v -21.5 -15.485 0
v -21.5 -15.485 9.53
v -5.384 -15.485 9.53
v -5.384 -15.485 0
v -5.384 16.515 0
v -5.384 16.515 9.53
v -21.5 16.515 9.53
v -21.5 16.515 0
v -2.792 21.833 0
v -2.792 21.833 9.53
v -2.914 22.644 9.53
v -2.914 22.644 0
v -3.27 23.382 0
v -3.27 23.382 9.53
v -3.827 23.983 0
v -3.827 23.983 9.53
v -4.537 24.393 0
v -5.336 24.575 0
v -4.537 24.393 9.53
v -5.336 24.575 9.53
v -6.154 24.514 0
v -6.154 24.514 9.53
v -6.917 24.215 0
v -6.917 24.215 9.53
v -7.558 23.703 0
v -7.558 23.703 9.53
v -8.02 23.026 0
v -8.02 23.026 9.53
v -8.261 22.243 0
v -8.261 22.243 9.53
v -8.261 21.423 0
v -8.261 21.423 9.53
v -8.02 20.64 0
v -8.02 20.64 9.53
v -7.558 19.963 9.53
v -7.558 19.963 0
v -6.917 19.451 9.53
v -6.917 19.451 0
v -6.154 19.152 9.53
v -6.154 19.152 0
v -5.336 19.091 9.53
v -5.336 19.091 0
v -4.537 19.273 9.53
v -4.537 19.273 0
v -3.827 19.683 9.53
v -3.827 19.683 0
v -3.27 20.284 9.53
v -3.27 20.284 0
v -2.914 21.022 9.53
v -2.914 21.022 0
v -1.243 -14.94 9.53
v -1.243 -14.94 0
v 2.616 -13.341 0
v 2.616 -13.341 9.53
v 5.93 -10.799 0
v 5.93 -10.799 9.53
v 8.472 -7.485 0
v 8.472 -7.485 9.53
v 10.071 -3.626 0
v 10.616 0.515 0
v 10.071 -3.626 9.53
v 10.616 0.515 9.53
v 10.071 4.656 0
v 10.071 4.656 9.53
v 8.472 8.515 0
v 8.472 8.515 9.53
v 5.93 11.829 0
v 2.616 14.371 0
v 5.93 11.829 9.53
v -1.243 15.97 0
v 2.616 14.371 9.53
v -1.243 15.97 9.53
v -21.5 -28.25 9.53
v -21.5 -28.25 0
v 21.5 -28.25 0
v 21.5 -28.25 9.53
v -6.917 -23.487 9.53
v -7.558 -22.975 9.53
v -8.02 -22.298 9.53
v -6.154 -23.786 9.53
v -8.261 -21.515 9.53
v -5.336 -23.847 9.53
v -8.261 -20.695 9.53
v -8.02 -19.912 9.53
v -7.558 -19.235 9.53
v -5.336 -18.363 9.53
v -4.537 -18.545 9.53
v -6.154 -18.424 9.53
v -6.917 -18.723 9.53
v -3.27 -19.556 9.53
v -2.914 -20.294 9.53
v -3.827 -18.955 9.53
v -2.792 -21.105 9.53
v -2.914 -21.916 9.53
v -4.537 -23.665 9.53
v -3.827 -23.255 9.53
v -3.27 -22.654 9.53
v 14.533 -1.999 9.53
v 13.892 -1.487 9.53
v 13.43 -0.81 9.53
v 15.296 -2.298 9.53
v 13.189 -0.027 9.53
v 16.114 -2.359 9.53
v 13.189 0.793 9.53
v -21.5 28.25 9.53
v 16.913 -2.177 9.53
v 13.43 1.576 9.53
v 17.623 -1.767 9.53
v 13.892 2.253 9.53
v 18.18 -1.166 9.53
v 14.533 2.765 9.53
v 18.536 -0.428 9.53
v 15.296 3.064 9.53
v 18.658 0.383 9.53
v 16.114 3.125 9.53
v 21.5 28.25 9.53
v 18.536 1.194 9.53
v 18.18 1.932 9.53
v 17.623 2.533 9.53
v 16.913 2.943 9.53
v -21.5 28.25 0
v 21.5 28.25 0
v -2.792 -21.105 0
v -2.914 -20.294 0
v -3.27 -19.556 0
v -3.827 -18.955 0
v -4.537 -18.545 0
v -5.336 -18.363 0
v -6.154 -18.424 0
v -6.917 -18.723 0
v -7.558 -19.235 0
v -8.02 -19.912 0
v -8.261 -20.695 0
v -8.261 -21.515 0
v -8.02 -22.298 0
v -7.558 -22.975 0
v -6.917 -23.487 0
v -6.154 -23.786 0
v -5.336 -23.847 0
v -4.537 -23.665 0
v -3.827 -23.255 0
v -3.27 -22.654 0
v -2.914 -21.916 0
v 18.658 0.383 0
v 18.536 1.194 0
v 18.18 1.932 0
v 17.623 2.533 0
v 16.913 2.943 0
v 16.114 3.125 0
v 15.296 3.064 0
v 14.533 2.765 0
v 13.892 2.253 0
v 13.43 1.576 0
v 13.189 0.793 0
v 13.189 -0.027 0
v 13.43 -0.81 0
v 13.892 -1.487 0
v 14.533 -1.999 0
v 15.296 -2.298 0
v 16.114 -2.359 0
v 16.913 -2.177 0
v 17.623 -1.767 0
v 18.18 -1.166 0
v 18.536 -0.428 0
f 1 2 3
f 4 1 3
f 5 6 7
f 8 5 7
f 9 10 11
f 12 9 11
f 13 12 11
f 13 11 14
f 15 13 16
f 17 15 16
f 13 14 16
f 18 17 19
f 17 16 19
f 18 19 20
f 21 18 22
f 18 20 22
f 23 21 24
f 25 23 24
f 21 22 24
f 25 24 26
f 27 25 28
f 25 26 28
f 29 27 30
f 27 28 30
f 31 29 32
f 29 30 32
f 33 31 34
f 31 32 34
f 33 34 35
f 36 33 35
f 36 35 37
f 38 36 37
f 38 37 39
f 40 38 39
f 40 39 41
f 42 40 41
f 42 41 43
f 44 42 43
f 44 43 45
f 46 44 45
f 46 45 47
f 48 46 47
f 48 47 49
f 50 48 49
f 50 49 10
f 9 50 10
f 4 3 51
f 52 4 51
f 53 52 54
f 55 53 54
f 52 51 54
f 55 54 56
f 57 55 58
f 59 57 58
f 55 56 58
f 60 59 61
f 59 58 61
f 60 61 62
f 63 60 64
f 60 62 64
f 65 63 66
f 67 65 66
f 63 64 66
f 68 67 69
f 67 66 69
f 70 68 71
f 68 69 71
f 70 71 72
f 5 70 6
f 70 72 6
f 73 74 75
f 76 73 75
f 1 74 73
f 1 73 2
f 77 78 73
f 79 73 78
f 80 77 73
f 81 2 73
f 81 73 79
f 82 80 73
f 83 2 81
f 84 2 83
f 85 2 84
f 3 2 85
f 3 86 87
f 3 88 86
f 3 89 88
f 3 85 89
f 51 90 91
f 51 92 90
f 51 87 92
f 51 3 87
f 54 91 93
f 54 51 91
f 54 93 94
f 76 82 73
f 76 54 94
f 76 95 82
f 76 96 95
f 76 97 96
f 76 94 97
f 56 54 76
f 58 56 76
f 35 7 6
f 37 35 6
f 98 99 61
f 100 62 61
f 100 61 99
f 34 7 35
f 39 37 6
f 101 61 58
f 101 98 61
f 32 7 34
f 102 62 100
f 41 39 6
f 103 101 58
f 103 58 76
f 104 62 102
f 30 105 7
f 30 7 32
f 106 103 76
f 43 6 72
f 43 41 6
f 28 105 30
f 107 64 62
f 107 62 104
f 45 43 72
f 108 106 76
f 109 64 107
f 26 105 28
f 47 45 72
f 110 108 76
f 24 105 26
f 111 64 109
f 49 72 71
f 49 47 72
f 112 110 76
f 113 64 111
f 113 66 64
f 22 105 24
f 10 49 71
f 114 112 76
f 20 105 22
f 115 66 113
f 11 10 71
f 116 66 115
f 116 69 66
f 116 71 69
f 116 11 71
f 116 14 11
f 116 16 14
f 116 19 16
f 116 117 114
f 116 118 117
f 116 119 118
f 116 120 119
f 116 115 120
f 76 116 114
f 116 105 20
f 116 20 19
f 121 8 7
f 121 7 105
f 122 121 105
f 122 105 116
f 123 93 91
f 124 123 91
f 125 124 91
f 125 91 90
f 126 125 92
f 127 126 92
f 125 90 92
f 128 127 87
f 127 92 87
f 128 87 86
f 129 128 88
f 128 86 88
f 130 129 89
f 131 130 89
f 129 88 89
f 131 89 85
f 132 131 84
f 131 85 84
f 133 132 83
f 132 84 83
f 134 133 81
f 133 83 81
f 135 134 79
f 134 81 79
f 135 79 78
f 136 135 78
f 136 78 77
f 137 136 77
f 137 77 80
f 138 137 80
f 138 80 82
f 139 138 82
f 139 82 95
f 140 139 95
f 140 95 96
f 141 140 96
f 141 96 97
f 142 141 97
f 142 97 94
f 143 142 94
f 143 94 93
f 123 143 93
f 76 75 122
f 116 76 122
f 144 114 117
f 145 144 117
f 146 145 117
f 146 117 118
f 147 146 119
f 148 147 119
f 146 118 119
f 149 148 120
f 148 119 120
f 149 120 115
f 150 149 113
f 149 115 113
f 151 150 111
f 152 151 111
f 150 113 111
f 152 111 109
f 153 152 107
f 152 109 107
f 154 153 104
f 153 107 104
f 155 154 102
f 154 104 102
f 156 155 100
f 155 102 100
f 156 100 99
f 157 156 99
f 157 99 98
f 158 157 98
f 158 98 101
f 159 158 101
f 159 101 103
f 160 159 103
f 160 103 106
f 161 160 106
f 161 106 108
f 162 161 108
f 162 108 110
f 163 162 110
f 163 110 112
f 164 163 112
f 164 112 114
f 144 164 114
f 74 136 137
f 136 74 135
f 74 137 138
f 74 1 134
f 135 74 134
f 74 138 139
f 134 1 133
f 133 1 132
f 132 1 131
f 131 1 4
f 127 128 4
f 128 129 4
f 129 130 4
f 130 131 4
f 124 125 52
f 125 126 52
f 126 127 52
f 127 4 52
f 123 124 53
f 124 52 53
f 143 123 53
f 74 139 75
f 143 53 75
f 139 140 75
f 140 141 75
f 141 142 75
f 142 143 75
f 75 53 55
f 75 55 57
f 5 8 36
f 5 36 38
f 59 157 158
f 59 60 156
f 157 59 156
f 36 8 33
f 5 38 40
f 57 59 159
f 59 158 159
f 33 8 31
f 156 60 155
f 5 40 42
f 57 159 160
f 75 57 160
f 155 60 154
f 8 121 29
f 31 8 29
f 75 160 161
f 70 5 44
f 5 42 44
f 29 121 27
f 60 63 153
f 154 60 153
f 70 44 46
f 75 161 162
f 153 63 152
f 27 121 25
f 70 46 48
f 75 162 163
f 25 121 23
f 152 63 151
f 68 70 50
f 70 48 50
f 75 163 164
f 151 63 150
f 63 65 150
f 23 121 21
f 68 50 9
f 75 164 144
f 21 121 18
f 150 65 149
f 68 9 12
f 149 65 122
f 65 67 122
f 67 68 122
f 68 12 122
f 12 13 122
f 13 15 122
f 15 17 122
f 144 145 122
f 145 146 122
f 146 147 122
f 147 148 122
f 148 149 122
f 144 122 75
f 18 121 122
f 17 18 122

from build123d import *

# Parameters (mm, degrees)
CROQUIS1_W              = 43
CROQUIS1_H              = 56.5
SALIENTE_EXTRUIR1_DEPTH = 9.53
CORTAR_EXTRUIR1_DEPTH   = 9.53
CORTAR_EXTRUIR2_REACH   = 38.758
CROQUIS3_R              = 2.75


with BuildPart() as part:
    # Croquis1 → Saliente-Extruir1 (new body)
    with BuildSketch(Plane.XY):
        Rectangle(CROQUIS1_W, CROQUIS1_H)
    extrude(amount=SALIENTE_EXTRUIR1_DEPTH)

    # Croquis2 → Cortar-Extruir1 (cut)
    with BuildSketch(Plane.XY.offset(9.53)):
        with BuildLine():
            ThreePointArc((-5.384, -15.485), (10.616, 0.515), (-5.384, 16.515))
            Line((-5.384, 16.515), (-21.5, 16.515))
            Line((-21.5, 16.515), (-21.5, -15.485))
            Line((-21.5, -15.485), (-5.384, -15.485))
        make_face()
    extrude(amount=-CORTAR_EXTRUIR1_DEPTH, mode=Mode.SUBTRACT)

    # Croquis3 → Cortar-Extruir2 (cut, up to next)
    with BuildSketch(Plane.XY.offset(9.53), mode=Mode.PRIVATE) as cortar_extruir2_sk1:
        with Locations((15.908, 0.383)):
            Circle(CROQUIS3_R)
    cortar_extruir2_tool1 = extrude(cortar_extruir2_sk1.sketch, amount=-CORTAR_EXTRUIR2_REACH, mode=Mode.PRIVATE) & part.part
    # Croquis3 → Cortar-Extruir2 (cut, up to next)
    with BuildSketch(Plane.XY.offset(9.53), mode=Mode.PRIVATE) as cortar_extruir2_sk2:
        with Locations((-5.542, 21.833)):
            Circle(CROQUIS3_R)
    cortar_extruir2_tool2 = extrude(cortar_extruir2_sk2.sketch, amount=-CORTAR_EXTRUIR2_REACH, mode=Mode.PRIVATE) & part.part
    # Croquis3 → Cortar-Extruir2 (cut, up to next)
    with BuildSketch(Plane.XY.offset(9.53), mode=Mode.PRIVATE) as cortar_extruir2_sk3:
        with Locations((-5.542, -21.105)):
            Circle(CROQUIS3_R)
    cortar_extruir2_tool3 = extrude(cortar_extruir2_sk3.sketch, amount=-CORTAR_EXTRUIR2_REACH, mode=Mode.PRIVATE) & part.part
    add(cortar_extruir2_tool1.solids().sort_by_distance((15.908, 0.383, 9.53))[0], mode=Mode.SUBTRACT)
    add(cortar_extruir2_tool2.solids().sort_by_distance((-5.542, 21.833, 9.53))[0], mode=Mode.SUBTRACT)
    add(cortar_extruir2_tool3.solids().sort_by_distance((-5.542, -21.105, 9.53))[0], mode=Mode.SUBTRACT)


solid = part.part
